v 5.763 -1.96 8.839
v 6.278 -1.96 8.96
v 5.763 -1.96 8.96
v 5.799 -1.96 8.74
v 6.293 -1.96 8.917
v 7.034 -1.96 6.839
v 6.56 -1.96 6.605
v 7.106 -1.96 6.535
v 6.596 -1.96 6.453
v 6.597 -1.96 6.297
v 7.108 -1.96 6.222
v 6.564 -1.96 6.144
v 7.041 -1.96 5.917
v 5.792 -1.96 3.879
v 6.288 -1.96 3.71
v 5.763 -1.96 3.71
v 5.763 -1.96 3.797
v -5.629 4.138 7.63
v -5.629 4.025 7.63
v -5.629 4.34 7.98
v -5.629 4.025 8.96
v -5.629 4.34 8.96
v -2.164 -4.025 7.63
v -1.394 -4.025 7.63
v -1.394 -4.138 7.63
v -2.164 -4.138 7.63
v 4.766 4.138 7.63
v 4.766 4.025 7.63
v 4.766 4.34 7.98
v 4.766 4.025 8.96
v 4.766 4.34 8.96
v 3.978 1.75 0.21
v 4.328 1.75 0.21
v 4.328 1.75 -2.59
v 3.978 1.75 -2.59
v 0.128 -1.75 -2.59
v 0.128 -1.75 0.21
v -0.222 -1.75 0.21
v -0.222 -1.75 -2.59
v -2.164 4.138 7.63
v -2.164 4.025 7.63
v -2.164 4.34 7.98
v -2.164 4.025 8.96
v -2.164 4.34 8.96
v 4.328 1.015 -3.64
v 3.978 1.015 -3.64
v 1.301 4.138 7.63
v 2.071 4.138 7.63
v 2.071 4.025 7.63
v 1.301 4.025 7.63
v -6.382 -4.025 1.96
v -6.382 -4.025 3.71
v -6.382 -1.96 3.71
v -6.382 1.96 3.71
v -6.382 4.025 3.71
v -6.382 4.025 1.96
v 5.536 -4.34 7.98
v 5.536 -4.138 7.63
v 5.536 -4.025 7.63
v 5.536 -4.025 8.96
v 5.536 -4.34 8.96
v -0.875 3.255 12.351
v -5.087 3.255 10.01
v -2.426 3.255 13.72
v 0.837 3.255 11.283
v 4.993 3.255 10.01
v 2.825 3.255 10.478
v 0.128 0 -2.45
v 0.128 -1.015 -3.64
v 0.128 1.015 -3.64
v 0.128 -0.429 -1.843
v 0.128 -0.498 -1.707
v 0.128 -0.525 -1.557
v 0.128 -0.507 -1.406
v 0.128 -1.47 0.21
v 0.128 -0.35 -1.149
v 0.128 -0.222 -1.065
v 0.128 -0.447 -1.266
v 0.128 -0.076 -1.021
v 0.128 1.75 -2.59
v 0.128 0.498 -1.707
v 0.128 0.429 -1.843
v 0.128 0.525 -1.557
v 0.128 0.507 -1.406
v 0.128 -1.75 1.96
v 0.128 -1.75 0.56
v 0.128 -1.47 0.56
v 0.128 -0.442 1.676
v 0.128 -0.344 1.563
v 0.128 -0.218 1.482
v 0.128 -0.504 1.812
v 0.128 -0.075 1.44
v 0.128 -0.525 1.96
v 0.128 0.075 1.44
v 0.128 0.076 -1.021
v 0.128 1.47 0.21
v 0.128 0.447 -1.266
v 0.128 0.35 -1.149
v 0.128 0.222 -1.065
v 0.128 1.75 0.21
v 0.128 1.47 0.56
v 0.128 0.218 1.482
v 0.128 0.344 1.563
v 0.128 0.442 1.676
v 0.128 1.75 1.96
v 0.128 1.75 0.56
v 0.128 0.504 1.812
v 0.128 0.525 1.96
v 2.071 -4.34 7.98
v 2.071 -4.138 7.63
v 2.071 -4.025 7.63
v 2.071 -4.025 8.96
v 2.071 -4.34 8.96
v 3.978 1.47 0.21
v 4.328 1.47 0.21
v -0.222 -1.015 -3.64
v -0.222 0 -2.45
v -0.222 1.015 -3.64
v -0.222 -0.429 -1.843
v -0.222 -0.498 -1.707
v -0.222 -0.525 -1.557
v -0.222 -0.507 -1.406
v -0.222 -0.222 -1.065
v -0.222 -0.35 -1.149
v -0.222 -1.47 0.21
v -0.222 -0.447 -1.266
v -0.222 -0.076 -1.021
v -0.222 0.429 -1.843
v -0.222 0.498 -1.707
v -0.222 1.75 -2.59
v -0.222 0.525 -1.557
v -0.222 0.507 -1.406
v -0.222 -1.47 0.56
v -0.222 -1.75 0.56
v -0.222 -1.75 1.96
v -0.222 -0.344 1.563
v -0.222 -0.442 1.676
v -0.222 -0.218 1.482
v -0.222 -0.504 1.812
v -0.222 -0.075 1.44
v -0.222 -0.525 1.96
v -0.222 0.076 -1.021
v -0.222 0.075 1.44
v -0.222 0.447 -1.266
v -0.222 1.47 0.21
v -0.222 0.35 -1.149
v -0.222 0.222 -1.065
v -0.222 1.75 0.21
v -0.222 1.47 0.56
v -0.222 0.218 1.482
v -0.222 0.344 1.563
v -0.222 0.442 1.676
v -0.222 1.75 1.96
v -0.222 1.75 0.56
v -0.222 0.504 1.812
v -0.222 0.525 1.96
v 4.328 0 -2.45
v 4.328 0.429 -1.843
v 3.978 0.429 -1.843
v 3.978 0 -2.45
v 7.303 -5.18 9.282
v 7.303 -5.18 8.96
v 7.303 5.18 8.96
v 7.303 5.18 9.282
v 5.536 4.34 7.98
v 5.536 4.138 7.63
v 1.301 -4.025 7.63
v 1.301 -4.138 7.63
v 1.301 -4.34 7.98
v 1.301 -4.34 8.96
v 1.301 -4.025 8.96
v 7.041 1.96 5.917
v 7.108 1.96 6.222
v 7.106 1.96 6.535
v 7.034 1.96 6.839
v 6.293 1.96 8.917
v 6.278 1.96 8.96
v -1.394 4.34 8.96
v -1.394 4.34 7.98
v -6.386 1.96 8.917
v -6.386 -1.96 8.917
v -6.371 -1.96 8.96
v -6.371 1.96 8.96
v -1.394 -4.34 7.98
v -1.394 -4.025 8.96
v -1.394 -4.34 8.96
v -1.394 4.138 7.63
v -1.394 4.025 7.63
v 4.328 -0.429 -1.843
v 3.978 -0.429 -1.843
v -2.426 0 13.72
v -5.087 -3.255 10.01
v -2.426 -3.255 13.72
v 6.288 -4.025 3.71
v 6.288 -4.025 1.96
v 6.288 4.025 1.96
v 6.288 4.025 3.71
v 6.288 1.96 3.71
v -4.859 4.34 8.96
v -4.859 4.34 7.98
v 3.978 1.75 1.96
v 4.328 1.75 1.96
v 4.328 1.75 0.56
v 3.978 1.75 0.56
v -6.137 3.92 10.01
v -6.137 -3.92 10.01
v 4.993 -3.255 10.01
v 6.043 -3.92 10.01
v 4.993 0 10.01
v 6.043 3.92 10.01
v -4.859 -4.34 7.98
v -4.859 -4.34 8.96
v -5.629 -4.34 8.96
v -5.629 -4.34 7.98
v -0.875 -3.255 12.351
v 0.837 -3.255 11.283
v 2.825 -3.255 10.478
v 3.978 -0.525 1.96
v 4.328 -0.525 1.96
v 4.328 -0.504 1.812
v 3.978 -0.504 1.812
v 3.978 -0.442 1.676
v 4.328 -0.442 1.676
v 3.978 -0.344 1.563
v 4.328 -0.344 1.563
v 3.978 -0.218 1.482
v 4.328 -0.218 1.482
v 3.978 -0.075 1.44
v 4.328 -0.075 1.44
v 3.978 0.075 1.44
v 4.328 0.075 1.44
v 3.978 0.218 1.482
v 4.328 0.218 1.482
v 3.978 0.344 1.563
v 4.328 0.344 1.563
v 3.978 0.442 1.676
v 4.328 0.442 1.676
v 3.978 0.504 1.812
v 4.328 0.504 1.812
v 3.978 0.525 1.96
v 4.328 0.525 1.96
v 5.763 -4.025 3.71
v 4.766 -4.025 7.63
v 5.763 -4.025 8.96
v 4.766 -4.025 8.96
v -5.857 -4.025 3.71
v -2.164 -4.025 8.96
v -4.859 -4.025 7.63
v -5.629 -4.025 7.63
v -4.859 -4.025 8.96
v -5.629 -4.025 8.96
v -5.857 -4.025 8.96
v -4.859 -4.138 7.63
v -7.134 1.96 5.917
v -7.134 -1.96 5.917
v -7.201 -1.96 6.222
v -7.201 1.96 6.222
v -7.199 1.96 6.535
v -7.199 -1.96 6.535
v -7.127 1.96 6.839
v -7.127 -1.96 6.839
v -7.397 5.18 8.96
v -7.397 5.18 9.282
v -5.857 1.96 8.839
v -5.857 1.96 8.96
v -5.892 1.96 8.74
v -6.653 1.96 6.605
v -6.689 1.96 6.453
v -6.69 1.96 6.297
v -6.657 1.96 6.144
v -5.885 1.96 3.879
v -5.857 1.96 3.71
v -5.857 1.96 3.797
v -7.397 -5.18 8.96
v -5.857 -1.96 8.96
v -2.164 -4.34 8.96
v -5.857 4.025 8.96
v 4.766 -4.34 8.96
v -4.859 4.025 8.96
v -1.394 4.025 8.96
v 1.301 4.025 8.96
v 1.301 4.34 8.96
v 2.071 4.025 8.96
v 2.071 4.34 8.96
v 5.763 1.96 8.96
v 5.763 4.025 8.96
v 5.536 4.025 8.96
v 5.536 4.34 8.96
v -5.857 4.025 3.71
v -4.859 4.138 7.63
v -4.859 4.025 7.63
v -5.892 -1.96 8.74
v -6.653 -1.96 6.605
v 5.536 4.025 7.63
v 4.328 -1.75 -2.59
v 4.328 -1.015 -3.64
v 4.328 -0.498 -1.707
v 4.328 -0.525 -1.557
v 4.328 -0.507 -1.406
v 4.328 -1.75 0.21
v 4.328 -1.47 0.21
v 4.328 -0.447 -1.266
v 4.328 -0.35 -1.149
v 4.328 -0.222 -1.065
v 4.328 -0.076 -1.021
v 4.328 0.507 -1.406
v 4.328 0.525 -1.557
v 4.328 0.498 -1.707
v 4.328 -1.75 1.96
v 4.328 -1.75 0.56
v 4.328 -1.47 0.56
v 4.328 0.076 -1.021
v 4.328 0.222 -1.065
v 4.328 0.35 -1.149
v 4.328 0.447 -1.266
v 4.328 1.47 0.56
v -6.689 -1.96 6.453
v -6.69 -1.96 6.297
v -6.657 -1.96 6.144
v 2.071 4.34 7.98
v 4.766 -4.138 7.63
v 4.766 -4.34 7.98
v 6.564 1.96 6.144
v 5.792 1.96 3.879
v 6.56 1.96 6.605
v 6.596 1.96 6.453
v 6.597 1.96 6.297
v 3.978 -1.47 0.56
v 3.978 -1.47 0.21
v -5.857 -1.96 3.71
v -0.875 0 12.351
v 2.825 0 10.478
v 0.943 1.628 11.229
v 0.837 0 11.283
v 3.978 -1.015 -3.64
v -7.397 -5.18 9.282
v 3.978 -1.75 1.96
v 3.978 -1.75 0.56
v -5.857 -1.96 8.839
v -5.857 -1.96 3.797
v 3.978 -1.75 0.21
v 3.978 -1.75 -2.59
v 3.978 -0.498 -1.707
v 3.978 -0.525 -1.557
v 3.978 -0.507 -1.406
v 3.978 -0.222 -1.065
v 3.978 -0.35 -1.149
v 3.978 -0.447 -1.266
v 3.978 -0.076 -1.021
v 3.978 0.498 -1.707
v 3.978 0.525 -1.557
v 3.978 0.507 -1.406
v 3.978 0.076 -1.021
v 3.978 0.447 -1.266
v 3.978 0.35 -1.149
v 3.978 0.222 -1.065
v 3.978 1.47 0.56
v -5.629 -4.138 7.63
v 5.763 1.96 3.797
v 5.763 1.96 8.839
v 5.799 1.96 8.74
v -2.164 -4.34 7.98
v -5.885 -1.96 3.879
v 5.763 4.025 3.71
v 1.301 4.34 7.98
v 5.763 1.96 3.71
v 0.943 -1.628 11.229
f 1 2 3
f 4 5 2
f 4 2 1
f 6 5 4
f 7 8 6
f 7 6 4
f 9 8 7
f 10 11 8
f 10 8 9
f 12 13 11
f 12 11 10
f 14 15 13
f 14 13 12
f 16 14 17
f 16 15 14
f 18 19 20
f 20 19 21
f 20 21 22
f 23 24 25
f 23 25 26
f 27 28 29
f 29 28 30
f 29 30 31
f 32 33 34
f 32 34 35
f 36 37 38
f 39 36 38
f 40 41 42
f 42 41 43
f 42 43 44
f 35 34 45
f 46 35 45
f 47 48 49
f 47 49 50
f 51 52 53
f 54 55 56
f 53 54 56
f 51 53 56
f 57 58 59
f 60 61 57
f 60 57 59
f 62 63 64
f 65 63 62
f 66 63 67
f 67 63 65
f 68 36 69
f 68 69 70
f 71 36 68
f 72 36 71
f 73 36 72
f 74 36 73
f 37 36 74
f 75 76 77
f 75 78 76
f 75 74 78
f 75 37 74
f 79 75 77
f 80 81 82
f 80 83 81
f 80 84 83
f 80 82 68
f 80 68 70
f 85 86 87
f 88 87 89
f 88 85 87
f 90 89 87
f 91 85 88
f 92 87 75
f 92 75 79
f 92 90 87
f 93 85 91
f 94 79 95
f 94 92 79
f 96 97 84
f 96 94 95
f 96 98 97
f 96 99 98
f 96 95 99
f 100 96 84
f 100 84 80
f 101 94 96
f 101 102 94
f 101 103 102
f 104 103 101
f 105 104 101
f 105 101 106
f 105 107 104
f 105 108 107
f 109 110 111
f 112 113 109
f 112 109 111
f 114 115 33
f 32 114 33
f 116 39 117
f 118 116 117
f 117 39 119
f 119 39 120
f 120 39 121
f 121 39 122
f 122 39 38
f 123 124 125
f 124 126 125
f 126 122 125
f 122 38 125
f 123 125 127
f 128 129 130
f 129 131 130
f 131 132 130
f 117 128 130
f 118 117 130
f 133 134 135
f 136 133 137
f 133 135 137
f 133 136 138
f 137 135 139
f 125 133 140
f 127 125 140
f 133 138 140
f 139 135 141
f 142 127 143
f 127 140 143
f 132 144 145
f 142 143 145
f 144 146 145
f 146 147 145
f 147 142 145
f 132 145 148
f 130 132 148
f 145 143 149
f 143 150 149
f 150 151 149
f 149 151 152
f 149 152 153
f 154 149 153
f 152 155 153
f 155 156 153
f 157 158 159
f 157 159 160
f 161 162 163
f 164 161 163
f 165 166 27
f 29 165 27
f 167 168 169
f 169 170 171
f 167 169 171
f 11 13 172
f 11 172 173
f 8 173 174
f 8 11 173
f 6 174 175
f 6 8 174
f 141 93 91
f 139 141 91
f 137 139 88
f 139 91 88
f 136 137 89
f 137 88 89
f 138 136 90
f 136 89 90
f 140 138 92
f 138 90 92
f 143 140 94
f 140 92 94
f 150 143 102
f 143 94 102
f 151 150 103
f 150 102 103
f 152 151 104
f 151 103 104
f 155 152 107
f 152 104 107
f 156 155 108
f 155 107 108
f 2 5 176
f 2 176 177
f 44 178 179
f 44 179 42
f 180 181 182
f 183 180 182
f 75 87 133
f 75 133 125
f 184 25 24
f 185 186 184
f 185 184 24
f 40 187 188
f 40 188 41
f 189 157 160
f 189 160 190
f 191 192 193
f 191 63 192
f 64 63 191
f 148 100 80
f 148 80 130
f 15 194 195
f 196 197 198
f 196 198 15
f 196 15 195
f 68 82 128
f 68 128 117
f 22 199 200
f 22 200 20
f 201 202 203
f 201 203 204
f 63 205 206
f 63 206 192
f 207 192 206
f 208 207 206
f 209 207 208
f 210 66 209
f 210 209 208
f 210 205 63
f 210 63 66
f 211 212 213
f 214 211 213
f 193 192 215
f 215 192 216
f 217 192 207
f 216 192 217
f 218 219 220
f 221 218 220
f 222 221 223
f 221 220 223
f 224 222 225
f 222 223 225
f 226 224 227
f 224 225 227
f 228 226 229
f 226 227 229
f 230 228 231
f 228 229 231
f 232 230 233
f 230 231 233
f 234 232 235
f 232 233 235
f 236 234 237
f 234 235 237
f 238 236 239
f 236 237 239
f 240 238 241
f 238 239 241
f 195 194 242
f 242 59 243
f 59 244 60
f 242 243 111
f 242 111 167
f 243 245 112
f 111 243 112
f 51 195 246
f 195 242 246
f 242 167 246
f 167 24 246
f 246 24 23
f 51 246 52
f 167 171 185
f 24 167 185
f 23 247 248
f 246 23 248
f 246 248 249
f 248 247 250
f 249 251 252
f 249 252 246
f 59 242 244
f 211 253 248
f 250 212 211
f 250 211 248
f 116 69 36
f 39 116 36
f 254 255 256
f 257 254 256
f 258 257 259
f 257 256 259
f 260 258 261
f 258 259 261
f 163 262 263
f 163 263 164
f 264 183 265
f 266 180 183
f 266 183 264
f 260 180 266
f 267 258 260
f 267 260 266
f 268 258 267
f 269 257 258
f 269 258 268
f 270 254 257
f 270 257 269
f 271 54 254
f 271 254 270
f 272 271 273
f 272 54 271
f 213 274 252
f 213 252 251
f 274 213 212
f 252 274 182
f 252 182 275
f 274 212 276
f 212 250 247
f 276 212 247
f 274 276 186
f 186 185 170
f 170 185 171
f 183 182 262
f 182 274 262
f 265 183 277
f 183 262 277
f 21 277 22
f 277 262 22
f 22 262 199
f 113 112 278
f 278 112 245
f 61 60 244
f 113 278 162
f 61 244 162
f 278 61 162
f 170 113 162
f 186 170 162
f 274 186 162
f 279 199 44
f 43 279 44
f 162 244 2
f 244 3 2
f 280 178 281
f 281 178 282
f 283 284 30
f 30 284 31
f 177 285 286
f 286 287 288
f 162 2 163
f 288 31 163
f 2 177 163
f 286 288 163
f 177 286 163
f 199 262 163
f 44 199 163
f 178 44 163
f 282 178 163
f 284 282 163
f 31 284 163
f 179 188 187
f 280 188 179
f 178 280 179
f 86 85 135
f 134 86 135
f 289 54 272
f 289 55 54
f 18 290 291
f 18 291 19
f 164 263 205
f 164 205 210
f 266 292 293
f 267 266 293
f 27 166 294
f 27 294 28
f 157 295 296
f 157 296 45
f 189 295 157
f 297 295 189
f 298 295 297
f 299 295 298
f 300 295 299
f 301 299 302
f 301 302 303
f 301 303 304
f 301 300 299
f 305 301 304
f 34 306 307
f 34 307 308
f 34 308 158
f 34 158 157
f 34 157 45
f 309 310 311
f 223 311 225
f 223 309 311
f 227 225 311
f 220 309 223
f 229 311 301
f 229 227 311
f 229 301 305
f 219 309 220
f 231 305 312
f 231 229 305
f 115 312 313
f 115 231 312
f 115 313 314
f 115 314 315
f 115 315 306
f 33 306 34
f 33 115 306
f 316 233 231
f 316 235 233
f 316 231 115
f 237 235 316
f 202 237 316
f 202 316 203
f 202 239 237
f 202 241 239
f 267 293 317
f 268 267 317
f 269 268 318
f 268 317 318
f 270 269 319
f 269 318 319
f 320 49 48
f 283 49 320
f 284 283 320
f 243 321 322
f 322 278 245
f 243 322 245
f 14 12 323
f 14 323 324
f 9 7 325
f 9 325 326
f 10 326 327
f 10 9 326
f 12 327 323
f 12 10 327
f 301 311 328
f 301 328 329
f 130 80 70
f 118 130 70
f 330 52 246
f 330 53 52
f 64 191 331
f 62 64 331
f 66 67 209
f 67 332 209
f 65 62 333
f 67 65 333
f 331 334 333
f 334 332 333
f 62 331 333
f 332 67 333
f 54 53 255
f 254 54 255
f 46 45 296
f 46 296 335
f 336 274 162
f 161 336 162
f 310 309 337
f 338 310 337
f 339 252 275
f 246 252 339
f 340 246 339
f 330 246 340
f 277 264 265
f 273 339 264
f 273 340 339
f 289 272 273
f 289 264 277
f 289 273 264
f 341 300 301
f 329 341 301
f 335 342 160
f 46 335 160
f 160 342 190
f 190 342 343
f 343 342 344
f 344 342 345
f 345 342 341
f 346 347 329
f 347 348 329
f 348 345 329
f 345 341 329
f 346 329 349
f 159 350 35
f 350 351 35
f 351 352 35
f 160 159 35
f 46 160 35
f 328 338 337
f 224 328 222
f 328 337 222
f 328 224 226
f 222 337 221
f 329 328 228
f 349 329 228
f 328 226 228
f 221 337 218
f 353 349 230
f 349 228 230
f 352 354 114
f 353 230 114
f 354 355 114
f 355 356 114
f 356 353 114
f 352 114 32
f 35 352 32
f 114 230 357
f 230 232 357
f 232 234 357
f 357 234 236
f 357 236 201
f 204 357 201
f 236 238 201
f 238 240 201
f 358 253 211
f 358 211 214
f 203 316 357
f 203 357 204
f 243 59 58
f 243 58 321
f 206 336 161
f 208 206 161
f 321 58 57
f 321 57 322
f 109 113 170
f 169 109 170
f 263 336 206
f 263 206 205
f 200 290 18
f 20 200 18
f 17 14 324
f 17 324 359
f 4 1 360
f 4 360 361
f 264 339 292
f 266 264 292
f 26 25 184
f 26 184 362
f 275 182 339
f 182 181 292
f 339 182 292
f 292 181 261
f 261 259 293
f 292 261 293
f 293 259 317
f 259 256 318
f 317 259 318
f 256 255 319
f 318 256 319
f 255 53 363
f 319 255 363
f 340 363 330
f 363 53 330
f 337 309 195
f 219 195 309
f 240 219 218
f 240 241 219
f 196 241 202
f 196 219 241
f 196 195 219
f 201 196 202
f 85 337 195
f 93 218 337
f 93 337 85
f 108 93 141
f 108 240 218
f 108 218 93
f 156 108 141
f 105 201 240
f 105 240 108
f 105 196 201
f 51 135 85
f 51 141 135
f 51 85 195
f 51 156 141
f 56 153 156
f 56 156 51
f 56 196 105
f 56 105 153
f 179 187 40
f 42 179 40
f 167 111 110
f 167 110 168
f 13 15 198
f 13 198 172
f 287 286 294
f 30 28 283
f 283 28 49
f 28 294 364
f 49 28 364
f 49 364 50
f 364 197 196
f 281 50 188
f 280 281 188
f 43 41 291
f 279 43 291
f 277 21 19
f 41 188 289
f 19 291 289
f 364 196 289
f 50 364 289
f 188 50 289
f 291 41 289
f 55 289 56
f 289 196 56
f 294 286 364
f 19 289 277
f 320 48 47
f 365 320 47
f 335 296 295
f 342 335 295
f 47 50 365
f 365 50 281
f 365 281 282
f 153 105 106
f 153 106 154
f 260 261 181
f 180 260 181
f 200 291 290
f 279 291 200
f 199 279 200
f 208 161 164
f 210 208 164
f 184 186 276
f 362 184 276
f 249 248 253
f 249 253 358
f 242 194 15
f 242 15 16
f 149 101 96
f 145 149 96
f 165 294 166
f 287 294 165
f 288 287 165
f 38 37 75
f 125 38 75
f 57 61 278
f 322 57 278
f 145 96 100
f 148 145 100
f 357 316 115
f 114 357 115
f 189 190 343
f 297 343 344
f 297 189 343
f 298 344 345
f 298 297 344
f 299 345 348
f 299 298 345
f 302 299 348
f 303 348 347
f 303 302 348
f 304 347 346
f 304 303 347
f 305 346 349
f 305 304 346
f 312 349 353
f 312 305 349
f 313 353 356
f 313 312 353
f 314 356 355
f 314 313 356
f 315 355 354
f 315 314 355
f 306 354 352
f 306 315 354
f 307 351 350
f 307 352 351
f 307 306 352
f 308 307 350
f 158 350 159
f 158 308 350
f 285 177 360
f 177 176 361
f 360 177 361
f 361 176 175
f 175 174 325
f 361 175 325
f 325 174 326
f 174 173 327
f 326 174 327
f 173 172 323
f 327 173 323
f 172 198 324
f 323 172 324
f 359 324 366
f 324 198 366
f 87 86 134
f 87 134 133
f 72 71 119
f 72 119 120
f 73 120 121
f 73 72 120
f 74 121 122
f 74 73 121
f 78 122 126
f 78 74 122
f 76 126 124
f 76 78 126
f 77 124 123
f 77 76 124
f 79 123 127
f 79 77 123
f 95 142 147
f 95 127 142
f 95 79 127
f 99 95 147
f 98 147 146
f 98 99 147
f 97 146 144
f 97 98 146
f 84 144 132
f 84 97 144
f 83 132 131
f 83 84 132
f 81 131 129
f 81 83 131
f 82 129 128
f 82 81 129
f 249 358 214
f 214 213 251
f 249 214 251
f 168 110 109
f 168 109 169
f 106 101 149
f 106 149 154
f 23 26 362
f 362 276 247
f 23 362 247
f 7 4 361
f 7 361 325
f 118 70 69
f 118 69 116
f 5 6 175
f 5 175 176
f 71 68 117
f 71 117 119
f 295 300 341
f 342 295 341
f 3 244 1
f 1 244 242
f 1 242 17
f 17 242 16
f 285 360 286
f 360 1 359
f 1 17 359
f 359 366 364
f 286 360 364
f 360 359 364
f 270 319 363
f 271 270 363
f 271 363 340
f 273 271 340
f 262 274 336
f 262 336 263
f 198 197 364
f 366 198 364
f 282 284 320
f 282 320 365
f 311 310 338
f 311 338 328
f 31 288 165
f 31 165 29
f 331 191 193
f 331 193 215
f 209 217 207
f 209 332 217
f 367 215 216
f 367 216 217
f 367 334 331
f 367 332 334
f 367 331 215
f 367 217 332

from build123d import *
from OCP.BRepFilletAPI import BRepFilletAPI_MakeChamfer

# Parameters (mm, degrees)
SKETCH1_W                       = 16.6
SKETCH1_H                       = 11.5
BOSS_EXTRUDE1_DEPTH             = 10
SKETCH2_W                       = 21
SKETCH2_H                       = 14.8
BOSS_EXTRUDE2_DEPTH             = 1.5
SKETCH3_W                       = 0.5
SKETCH3_H                       = 5
BOSS_EXTRUDE3_DEPTH             = 8
SKETCH4_W                       = 0.5
SKETCH4_H                       = 0.4
CUT_EXTRUDE1_DEPTH              = 22.623424798
BOSS_EXTRUDE4_REACH             = 19.241
SKETCH5_W                       = 0.75
SKETCH5_H                       = 2.5
BOSS_EXTRUDE4_DIRECTION_2_REACH = 19.241
BOSS_EXTRUDE5_DEPTH             = 2.8
BOSS_EXTRUDE5_DEPTH_BACK        = 2.8
CHAMFER1_SIZE                   = 1.8
CHAMFER1_SIZE2                  = 1.039230485
BOSS_EXTRUDE6_DEPTH             = 4.65
SKETCH9_W                       = 1.1
SKETCH9_H                       = 0.45
BOSS_EXTRUDE7_DEPTH             = 1.9
CHAMFER2_SIZE                   = 0.5
CHAMFER2_SIZE2                  = 0.288675135
SCALE2_SCALE                    = 0.7


with BuildPart() as part:
    # Sketch1 → Boss-Extrude1 (new body)
    with BuildSketch(Plane.XY):
        Rectangle(SKETCH1_W, SKETCH1_H)
    extrude(amount=BOSS_EXTRUDE1_DEPTH)

    # Sketch2 → Boss-Extrude2 (add)
    with BuildSketch(Plane.XY.offset(10)):
        Rectangle(SKETCH2_W, SKETCH2_H)
    extrude(amount=BOSS_EXTRUDE2_DEPTH)

    # Sketch3 → Boss-Extrude3 (add)
    with BuildSketch(Plane(origin=(0, 0, 0), x_dir=(-1, 0, 0), z_dir=(0, 0, -1))):
        with Locations((-6, 0)):
            Rectangle(SKETCH3_W, SKETCH3_H)
        Rectangle(SKETCH3_W, SKETCH3_H)
    extrude(amount=BOSS_EXTRUDE3_DEPTH)

    # Sketch4 → Cut-Extrude1 (cut, through all)
    with BuildSketch(Plane(origin=(6.25, 0, 0), x_dir=(0, 0, -1), z_dir=(1, 0, 0))):
        with Locations((2.25, 2.3)):
            Rectangle(SKETCH4_W, SKETCH4_H)
        with BuildLine():
            Line((0, 0.75), (0, -0.75))
            ThreePointArc((0, -0.75), (0.75, 0), (0, 0.75))
        make_face()
        Polygon((6.5, 2.5), (8, 1.449688693), (8, 2.5), align=None)
        with BuildLine():
            Line((5.432692308, 0.612598863), (6.3, 0))
            Line((6.3, 0), (5.432692308, -0.612598863))
            ThreePointArc((5.432692308, -0.612598863), (4.25, 0), (5.432692308, 0.612598863))
        make_face()
        Polygon((8, -2.5), (8, -1.449688693), (6.5, -2.5), align=None)
        with Locations((2.25, -2.3)):
            Rectangle(SKETCH4_W, SKETCH4_H)
    extrude(amount=-CUT_EXTRUDE1_DEPTH, mode=Mode.SUBTRACT)

    # Boss-Extrude4: up to this face of the body (flat: up to its plane)
    boss_extrude4_end = Plane(part.part.faces().sort_by_distance((0, 5.75, 5))[0])
    # Sketch5 → Boss-Extrude4 (add, up to the picked face)
    with BuildSketch(Plane(origin=(0, 0, 0), x_dir=(1, 0, 0), z_dir=(0, 1, 0)), mode=Mode.PRIVATE) as boss_extrude4_sk1:
        with Locations((-8.675, -1.25)):
            Rectangle(SKETCH5_W, SKETCH5_H)
    boss_extrude4_tool1 = split(extrude(boss_extrude4_sk1.sketch, amount=BOSS_EXTRUDE4_REACH, mode=Mode.PRIVATE), bisect_by=boss_extrude4_end, keep=Keep.BOTH, mode=Mode.PRIVATE)
    boss_extrude4 = boss_extrude4_tool1.solids().sort_by(Axis((-8.675, 0, 1.25), (0, 1, 0)))[0]
    add(boss_extrude4)

    # Boss-Extrude4 direction 2: up to this face of the body (flat: up to its plane)
    boss_extrude4_direction_2_end = Plane(part.part.faces().sort_by_distance((0, -5.75, 5))[0])
    # Sketch5 → Boss-Extrude4 direction 2 (add, up to the picked face)
    with BuildSketch(Plane(origin=(0, 0, 0), x_dir=(1, 0, 0), z_dir=(0, 1, 0)), mode=Mode.PRIVATE) as boss_extrude4_direction_2_sk1:
        with Locations((-8.675, -1.25)):
            Rectangle(SKETCH5_W, SKETCH5_H)
    boss_extrude4_direction_2_tool1 = split(extrude(boss_extrude4_direction_2_sk1.sketch, amount=-BOSS_EXTRUDE4_DIRECTION_2_REACH, mode=Mode.PRIVATE), bisect_by=boss_extrude4_direction_2_end, keep=Keep.BOTH, mode=Mode.PRIVATE)
    boss_extrude4_direction_2 = boss_extrude4_direction_2_tool1.solids().sort_by(Axis((-8.675, 0, 1.25), (0, -1, 0)))[0]
    add(boss_extrude4_direction_2)

    # Mirror1: Boss-Extrude4, Boss-Extrude4 direction 2 across plane
    add(boss_extrude4.mirror(Plane(origin=(0, 0, 0), x_dir=(0, 0, 1), z_dir=(1, 0, 0))))
    add(boss_extrude4_direction_2.mirror(Plane(origin=(0, 0, 0), x_dir=(0, 0, 1), z_dir=(1, 0, 0))))

    # Sketch6 → Boss-Extrude5 (add, two sides: drawn at the far end of the back side and taken through both)
    with BuildSketch(Plane(origin=(0, 0, 0), x_dir=(1, 0, 0), z_dir=(0, 1, 0)).offset(-BOSS_EXTRUDE5_DEPTH_BACK)):
        with BuildLine():
            Line((-9.05, -2.5), (-10.124907983, -5.653347952))
            ThreePointArc((-10.124907983, -5.653347952), (-10.231819447, -6.312838644), (-10.115557515, -6.970745323))
            Line((-10.115557515, -6.970745323), (-9.056614332, -9.938626949))
            Line((-9.056614332, -9.938626949), (-9.034716365, -10))
            Line((-9.034716365, -10), (-8.3, -10))
            Line((-8.3, -10), (-8.3, -9.827371619))
            Line((-8.3, -9.827371619), (-8.350231447, -9.686588817))
            Line((-8.350231447, -9.686588817), (-9.438479941, -6.636573707))
            ThreePointArc((-9.438479941, -6.636573707), (-9.496610907, -6.307620368), (-9.443155175, -5.977875022))
            Line((-9.443155175, -5.977875022), (-8.34011069, -2.741985882))
            Line((-8.34011069, -2.741985882), (-8.3, -2.624317241))
            Line((-8.3, -2.624317241), (-8.3, -2.5))
            Line((-8.3, -2.5), (-9.05, -2.5))
        make_face()
        with BuildLine():
            Line((8.3, -9.827371619), (8.350231447, -9.686588817))
            Line((8.350231447, -9.686588817), (9.438479941, -6.636573707))
            ThreePointArc((9.438479941, -6.636573707), (9.496610907, -6.307620368), (9.443155175, -5.977875022))
            Line((9.443155175, -5.977875022), (8.34011069, -2.741985882))
            Line((8.34011069, -2.741985882), (8.3, -2.624317241))
            Line((8.3, -2.624317241), (8.3, -2.5))
            Line((8.3, -2.5), (9.05, -2.5))
            Line((9.05, -2.5), (10.124907983, -5.653347952))
            ThreePointArc((10.124907983, -5.653347952), (10.231819447, -6.312838644), (10.115557515, -6.970745323))
            Line((10.115557515, -6.970745323), (9.056614332, -9.938626949))
            Line((9.056614332, -9.938626949), (9.034716365, -10))
            Line((9.034716365, -10), (8.3, -10))
            Line((8.3, -10), (8.3, -9.827371619))
        make_face()
    extrude(amount=BOSS_EXTRUDE5_DEPTH + BOSS_EXTRUDE5_DEPTH_BACK)

    # Chamfer1
    chamfer1_edges = [part.edges().sort_by_distance(p)[0] for p in [
        (10.5, 0, 11.5),
        (0, 7.4, 11.5),
        (-10.5, 0, 11.5),
        (0, -7.4, 11.5),
    ]]
    chamfer1_side = [part.faces().sort_by_distance(p)[0] for p in [
        (0, 0, 11.5),
    ]]
    chamfer(chamfer1_edges, length=CHAMFER1_SIZE, length2=CHAMFER1_SIZE2, reference=chamfer1_side[0])

    # Sketch7 → Boss-Extrude6 (add, symmetric)
    with BuildSketch(Plane(origin=(0, 0, 0), x_dir=(1, 0, 0), z_dir=(0, 1, 0))):
        with BuildLine():
            Line((-7.2, -11.5), (-3.398718251, -16.8))
            add(Edge.make_bspline(
                [(-3.398718251, -16.8), (0.927387699, -12.334784825), (7.2, -11.5)],
                knots=[0, 0, 0, 1, 1, 1], degree=2))
            Line((7.2, -11.5), (-7.2, -11.5))
        make_face()
    extrude(amount=BOSS_EXTRUDE6_DEPTH, both=True)

    # Sketch9 → Boss-Extrude7 (add)
    with BuildSketch(Plane(origin=(0, 0, 10), x_dir=(-1, 0, 0), z_dir=(0, 0, -1))):
        with Locations((-7.425, 5.975)):
            Rectangle(SKETCH9_W, SKETCH9_H)
        with Locations((-2.475, 5.975)):
            Rectangle(SKETCH9_W, SKETCH9_H)
        with Locations((2.475, 5.975)):
            Rectangle(SKETCH9_W, SKETCH9_H)
        with Locations((7.425, 5.975)):
            Rectangle(SKETCH9_W, SKETCH9_H)
        with Locations((7.425, -5.975)):
            Rectangle(SKETCH9_W, SKETCH9_H)
        with Locations((2.475, -5.975)):
            Rectangle(SKETCH9_W, SKETCH9_H)
        with Locations((-2.475, -5.975)):
            Rectangle(SKETCH9_W, SKETCH9_H)
        with Locations((-7.425, -5.975)):
            Rectangle(SKETCH9_W, SKETCH9_H)
    extrude(amount=BOSS_EXTRUDE7_DEPTH)

    # Chamfer2: one chamfer whose edges measure the first distance from different faces: ONE call of the kernel's chamfer builder (chamfer() names one face for all edges)
    chamfer2_edges_1 = [part.edges().sort_by_distance(p)[0] for p in [
        (7.425, 6.2, 8.1),
    ]]
    chamfer2_side_1 = [part.faces().sort_by_distance(p)[0] for p in [
        (7.425, 6.2, 9.05),
    ]]
    chamfer2_edges_2 = [part.edges().sort_by_distance(p)[0] for p in [
        (2.475, 6.2, 8.1),
    ]]
    chamfer2_side_2 = [part.faces().sort_by_distance(p)[0] for p in [
        (2.475, 6.2, 9.05),
    ]]
    chamfer2_edges_3 = [part.edges().sort_by_distance(p)[0] for p in [
        (-2.475, 6.2, 8.1),
    ]]
    chamfer2_side_3 = [part.faces().sort_by_distance(p)[0] for p in [
        (-2.475, 6.2, 9.05),
    ]]
    chamfer2_edges_4 = [part.edges().sort_by_distance(p)[0] for p in [
        (-7.425, 6.2, 8.1),
    ]]
    chamfer2_side_4 = [part.faces().sort_by_distance(p)[0] for p in [
        (-7.425, 6.2, 9.05),
    ]]
    chamfer2_edges_5 = [part.edges().sort_by_distance(p)[0] for p in [
        (-7.425, -6.2, 8.1),
    ]]
    chamfer2_side_5 = [part.faces().sort_by_distance(p)[0] for p in [
        (-7.425, -6.2, 9.05),
    ]]
    chamfer2_edges_6 = [part.edges().sort_by_distance(p)[0] for p in [
        (-2.475, -6.2, 8.1),
    ]]
    chamfer2_side_6 = [part.faces().sort_by_distance(p)[0] for p in [
        (-2.475, -6.2, 9.05),
    ]]
    chamfer2_edges_7 = [part.edges().sort_by_distance(p)[0] for p in [
        (2.475, -6.2, 8.1),
    ]]
    chamfer2_side_7 = [part.faces().sort_by_distance(p)[0] for p in [
        (2.475, -6.2, 9.05),
    ]]
    chamfer2_edges_8 = [part.edges().sort_by_distance(p)[0] for p in [
        (7.425, -6.2, 8.1),
    ]]
    chamfer2_side_8 = [part.faces().sort_by_distance(p)[0] for p in [
        (7.425, -6.2, 9.05),
    ]]
    chamfer2 = BRepFilletAPI_MakeChamfer(part.part.solid().wrapped)
    for e in chamfer2_edges_1:
        chamfer2.Add(CHAMFER2_SIZE, CHAMFER2_SIZE2, e.wrapped, chamfer2_side_1[0].wrapped)  # the first distance lies on this face
    for e in chamfer2_edges_2:
        chamfer2.Add(CHAMFER2_SIZE, CHAMFER2_SIZE2, e.wrapped, chamfer2_side_2[0].wrapped)  # the first distance lies on this face
    for e in chamfer2_edges_3:
        chamfer2.Add(CHAMFER2_SIZE, CHAMFER2_SIZE2, e.wrapped, chamfer2_side_3[0].wrapped)  # the first distance lies on this face
    for e in chamfer2_edges_4:
        chamfer2.Add(CHAMFER2_SIZE, CHAMFER2_SIZE2, e.wrapped, chamfer2_side_4[0].wrapped)  # the first distance lies on this face
    for e in chamfer2_edges_5:
        chamfer2.Add(CHAMFER2_SIZE, CHAMFER2_SIZE2, e.wrapped, chamfer2_side_5[0].wrapped)  # the first distance lies on this face
    for e in chamfer2_edges_6:
        chamfer2.Add(CHAMFER2_SIZE, CHAMFER2_SIZE2, e.wrapped, chamfer2_side_6[0].wrapped)  # the first distance lies on this face
    for e in chamfer2_edges_7:
        chamfer2.Add(CHAMFER2_SIZE, CHAMFER2_SIZE2, e.wrapped, chamfer2_side_7[0].wrapped)  # the first distance lies on this face
    for e in chamfer2_edges_8:
        chamfer2.Add(CHAMFER2_SIZE, CHAMFER2_SIZE2, e.wrapped, chamfer2_side_8[0].wrapped)  # the first distance lies on this face
    add(Compound.cast(chamfer2.Shape()), mode=Mode.REPLACE)


with BuildPart() as part_1:
    # Scale2: scaled about (-0.155191281, 0, 6.532138607)
    add(part.part.scale(SCALE2_SCALE).moved(Location((-0.046557384, 0, 1.959641582))))


solid = part_1.part
